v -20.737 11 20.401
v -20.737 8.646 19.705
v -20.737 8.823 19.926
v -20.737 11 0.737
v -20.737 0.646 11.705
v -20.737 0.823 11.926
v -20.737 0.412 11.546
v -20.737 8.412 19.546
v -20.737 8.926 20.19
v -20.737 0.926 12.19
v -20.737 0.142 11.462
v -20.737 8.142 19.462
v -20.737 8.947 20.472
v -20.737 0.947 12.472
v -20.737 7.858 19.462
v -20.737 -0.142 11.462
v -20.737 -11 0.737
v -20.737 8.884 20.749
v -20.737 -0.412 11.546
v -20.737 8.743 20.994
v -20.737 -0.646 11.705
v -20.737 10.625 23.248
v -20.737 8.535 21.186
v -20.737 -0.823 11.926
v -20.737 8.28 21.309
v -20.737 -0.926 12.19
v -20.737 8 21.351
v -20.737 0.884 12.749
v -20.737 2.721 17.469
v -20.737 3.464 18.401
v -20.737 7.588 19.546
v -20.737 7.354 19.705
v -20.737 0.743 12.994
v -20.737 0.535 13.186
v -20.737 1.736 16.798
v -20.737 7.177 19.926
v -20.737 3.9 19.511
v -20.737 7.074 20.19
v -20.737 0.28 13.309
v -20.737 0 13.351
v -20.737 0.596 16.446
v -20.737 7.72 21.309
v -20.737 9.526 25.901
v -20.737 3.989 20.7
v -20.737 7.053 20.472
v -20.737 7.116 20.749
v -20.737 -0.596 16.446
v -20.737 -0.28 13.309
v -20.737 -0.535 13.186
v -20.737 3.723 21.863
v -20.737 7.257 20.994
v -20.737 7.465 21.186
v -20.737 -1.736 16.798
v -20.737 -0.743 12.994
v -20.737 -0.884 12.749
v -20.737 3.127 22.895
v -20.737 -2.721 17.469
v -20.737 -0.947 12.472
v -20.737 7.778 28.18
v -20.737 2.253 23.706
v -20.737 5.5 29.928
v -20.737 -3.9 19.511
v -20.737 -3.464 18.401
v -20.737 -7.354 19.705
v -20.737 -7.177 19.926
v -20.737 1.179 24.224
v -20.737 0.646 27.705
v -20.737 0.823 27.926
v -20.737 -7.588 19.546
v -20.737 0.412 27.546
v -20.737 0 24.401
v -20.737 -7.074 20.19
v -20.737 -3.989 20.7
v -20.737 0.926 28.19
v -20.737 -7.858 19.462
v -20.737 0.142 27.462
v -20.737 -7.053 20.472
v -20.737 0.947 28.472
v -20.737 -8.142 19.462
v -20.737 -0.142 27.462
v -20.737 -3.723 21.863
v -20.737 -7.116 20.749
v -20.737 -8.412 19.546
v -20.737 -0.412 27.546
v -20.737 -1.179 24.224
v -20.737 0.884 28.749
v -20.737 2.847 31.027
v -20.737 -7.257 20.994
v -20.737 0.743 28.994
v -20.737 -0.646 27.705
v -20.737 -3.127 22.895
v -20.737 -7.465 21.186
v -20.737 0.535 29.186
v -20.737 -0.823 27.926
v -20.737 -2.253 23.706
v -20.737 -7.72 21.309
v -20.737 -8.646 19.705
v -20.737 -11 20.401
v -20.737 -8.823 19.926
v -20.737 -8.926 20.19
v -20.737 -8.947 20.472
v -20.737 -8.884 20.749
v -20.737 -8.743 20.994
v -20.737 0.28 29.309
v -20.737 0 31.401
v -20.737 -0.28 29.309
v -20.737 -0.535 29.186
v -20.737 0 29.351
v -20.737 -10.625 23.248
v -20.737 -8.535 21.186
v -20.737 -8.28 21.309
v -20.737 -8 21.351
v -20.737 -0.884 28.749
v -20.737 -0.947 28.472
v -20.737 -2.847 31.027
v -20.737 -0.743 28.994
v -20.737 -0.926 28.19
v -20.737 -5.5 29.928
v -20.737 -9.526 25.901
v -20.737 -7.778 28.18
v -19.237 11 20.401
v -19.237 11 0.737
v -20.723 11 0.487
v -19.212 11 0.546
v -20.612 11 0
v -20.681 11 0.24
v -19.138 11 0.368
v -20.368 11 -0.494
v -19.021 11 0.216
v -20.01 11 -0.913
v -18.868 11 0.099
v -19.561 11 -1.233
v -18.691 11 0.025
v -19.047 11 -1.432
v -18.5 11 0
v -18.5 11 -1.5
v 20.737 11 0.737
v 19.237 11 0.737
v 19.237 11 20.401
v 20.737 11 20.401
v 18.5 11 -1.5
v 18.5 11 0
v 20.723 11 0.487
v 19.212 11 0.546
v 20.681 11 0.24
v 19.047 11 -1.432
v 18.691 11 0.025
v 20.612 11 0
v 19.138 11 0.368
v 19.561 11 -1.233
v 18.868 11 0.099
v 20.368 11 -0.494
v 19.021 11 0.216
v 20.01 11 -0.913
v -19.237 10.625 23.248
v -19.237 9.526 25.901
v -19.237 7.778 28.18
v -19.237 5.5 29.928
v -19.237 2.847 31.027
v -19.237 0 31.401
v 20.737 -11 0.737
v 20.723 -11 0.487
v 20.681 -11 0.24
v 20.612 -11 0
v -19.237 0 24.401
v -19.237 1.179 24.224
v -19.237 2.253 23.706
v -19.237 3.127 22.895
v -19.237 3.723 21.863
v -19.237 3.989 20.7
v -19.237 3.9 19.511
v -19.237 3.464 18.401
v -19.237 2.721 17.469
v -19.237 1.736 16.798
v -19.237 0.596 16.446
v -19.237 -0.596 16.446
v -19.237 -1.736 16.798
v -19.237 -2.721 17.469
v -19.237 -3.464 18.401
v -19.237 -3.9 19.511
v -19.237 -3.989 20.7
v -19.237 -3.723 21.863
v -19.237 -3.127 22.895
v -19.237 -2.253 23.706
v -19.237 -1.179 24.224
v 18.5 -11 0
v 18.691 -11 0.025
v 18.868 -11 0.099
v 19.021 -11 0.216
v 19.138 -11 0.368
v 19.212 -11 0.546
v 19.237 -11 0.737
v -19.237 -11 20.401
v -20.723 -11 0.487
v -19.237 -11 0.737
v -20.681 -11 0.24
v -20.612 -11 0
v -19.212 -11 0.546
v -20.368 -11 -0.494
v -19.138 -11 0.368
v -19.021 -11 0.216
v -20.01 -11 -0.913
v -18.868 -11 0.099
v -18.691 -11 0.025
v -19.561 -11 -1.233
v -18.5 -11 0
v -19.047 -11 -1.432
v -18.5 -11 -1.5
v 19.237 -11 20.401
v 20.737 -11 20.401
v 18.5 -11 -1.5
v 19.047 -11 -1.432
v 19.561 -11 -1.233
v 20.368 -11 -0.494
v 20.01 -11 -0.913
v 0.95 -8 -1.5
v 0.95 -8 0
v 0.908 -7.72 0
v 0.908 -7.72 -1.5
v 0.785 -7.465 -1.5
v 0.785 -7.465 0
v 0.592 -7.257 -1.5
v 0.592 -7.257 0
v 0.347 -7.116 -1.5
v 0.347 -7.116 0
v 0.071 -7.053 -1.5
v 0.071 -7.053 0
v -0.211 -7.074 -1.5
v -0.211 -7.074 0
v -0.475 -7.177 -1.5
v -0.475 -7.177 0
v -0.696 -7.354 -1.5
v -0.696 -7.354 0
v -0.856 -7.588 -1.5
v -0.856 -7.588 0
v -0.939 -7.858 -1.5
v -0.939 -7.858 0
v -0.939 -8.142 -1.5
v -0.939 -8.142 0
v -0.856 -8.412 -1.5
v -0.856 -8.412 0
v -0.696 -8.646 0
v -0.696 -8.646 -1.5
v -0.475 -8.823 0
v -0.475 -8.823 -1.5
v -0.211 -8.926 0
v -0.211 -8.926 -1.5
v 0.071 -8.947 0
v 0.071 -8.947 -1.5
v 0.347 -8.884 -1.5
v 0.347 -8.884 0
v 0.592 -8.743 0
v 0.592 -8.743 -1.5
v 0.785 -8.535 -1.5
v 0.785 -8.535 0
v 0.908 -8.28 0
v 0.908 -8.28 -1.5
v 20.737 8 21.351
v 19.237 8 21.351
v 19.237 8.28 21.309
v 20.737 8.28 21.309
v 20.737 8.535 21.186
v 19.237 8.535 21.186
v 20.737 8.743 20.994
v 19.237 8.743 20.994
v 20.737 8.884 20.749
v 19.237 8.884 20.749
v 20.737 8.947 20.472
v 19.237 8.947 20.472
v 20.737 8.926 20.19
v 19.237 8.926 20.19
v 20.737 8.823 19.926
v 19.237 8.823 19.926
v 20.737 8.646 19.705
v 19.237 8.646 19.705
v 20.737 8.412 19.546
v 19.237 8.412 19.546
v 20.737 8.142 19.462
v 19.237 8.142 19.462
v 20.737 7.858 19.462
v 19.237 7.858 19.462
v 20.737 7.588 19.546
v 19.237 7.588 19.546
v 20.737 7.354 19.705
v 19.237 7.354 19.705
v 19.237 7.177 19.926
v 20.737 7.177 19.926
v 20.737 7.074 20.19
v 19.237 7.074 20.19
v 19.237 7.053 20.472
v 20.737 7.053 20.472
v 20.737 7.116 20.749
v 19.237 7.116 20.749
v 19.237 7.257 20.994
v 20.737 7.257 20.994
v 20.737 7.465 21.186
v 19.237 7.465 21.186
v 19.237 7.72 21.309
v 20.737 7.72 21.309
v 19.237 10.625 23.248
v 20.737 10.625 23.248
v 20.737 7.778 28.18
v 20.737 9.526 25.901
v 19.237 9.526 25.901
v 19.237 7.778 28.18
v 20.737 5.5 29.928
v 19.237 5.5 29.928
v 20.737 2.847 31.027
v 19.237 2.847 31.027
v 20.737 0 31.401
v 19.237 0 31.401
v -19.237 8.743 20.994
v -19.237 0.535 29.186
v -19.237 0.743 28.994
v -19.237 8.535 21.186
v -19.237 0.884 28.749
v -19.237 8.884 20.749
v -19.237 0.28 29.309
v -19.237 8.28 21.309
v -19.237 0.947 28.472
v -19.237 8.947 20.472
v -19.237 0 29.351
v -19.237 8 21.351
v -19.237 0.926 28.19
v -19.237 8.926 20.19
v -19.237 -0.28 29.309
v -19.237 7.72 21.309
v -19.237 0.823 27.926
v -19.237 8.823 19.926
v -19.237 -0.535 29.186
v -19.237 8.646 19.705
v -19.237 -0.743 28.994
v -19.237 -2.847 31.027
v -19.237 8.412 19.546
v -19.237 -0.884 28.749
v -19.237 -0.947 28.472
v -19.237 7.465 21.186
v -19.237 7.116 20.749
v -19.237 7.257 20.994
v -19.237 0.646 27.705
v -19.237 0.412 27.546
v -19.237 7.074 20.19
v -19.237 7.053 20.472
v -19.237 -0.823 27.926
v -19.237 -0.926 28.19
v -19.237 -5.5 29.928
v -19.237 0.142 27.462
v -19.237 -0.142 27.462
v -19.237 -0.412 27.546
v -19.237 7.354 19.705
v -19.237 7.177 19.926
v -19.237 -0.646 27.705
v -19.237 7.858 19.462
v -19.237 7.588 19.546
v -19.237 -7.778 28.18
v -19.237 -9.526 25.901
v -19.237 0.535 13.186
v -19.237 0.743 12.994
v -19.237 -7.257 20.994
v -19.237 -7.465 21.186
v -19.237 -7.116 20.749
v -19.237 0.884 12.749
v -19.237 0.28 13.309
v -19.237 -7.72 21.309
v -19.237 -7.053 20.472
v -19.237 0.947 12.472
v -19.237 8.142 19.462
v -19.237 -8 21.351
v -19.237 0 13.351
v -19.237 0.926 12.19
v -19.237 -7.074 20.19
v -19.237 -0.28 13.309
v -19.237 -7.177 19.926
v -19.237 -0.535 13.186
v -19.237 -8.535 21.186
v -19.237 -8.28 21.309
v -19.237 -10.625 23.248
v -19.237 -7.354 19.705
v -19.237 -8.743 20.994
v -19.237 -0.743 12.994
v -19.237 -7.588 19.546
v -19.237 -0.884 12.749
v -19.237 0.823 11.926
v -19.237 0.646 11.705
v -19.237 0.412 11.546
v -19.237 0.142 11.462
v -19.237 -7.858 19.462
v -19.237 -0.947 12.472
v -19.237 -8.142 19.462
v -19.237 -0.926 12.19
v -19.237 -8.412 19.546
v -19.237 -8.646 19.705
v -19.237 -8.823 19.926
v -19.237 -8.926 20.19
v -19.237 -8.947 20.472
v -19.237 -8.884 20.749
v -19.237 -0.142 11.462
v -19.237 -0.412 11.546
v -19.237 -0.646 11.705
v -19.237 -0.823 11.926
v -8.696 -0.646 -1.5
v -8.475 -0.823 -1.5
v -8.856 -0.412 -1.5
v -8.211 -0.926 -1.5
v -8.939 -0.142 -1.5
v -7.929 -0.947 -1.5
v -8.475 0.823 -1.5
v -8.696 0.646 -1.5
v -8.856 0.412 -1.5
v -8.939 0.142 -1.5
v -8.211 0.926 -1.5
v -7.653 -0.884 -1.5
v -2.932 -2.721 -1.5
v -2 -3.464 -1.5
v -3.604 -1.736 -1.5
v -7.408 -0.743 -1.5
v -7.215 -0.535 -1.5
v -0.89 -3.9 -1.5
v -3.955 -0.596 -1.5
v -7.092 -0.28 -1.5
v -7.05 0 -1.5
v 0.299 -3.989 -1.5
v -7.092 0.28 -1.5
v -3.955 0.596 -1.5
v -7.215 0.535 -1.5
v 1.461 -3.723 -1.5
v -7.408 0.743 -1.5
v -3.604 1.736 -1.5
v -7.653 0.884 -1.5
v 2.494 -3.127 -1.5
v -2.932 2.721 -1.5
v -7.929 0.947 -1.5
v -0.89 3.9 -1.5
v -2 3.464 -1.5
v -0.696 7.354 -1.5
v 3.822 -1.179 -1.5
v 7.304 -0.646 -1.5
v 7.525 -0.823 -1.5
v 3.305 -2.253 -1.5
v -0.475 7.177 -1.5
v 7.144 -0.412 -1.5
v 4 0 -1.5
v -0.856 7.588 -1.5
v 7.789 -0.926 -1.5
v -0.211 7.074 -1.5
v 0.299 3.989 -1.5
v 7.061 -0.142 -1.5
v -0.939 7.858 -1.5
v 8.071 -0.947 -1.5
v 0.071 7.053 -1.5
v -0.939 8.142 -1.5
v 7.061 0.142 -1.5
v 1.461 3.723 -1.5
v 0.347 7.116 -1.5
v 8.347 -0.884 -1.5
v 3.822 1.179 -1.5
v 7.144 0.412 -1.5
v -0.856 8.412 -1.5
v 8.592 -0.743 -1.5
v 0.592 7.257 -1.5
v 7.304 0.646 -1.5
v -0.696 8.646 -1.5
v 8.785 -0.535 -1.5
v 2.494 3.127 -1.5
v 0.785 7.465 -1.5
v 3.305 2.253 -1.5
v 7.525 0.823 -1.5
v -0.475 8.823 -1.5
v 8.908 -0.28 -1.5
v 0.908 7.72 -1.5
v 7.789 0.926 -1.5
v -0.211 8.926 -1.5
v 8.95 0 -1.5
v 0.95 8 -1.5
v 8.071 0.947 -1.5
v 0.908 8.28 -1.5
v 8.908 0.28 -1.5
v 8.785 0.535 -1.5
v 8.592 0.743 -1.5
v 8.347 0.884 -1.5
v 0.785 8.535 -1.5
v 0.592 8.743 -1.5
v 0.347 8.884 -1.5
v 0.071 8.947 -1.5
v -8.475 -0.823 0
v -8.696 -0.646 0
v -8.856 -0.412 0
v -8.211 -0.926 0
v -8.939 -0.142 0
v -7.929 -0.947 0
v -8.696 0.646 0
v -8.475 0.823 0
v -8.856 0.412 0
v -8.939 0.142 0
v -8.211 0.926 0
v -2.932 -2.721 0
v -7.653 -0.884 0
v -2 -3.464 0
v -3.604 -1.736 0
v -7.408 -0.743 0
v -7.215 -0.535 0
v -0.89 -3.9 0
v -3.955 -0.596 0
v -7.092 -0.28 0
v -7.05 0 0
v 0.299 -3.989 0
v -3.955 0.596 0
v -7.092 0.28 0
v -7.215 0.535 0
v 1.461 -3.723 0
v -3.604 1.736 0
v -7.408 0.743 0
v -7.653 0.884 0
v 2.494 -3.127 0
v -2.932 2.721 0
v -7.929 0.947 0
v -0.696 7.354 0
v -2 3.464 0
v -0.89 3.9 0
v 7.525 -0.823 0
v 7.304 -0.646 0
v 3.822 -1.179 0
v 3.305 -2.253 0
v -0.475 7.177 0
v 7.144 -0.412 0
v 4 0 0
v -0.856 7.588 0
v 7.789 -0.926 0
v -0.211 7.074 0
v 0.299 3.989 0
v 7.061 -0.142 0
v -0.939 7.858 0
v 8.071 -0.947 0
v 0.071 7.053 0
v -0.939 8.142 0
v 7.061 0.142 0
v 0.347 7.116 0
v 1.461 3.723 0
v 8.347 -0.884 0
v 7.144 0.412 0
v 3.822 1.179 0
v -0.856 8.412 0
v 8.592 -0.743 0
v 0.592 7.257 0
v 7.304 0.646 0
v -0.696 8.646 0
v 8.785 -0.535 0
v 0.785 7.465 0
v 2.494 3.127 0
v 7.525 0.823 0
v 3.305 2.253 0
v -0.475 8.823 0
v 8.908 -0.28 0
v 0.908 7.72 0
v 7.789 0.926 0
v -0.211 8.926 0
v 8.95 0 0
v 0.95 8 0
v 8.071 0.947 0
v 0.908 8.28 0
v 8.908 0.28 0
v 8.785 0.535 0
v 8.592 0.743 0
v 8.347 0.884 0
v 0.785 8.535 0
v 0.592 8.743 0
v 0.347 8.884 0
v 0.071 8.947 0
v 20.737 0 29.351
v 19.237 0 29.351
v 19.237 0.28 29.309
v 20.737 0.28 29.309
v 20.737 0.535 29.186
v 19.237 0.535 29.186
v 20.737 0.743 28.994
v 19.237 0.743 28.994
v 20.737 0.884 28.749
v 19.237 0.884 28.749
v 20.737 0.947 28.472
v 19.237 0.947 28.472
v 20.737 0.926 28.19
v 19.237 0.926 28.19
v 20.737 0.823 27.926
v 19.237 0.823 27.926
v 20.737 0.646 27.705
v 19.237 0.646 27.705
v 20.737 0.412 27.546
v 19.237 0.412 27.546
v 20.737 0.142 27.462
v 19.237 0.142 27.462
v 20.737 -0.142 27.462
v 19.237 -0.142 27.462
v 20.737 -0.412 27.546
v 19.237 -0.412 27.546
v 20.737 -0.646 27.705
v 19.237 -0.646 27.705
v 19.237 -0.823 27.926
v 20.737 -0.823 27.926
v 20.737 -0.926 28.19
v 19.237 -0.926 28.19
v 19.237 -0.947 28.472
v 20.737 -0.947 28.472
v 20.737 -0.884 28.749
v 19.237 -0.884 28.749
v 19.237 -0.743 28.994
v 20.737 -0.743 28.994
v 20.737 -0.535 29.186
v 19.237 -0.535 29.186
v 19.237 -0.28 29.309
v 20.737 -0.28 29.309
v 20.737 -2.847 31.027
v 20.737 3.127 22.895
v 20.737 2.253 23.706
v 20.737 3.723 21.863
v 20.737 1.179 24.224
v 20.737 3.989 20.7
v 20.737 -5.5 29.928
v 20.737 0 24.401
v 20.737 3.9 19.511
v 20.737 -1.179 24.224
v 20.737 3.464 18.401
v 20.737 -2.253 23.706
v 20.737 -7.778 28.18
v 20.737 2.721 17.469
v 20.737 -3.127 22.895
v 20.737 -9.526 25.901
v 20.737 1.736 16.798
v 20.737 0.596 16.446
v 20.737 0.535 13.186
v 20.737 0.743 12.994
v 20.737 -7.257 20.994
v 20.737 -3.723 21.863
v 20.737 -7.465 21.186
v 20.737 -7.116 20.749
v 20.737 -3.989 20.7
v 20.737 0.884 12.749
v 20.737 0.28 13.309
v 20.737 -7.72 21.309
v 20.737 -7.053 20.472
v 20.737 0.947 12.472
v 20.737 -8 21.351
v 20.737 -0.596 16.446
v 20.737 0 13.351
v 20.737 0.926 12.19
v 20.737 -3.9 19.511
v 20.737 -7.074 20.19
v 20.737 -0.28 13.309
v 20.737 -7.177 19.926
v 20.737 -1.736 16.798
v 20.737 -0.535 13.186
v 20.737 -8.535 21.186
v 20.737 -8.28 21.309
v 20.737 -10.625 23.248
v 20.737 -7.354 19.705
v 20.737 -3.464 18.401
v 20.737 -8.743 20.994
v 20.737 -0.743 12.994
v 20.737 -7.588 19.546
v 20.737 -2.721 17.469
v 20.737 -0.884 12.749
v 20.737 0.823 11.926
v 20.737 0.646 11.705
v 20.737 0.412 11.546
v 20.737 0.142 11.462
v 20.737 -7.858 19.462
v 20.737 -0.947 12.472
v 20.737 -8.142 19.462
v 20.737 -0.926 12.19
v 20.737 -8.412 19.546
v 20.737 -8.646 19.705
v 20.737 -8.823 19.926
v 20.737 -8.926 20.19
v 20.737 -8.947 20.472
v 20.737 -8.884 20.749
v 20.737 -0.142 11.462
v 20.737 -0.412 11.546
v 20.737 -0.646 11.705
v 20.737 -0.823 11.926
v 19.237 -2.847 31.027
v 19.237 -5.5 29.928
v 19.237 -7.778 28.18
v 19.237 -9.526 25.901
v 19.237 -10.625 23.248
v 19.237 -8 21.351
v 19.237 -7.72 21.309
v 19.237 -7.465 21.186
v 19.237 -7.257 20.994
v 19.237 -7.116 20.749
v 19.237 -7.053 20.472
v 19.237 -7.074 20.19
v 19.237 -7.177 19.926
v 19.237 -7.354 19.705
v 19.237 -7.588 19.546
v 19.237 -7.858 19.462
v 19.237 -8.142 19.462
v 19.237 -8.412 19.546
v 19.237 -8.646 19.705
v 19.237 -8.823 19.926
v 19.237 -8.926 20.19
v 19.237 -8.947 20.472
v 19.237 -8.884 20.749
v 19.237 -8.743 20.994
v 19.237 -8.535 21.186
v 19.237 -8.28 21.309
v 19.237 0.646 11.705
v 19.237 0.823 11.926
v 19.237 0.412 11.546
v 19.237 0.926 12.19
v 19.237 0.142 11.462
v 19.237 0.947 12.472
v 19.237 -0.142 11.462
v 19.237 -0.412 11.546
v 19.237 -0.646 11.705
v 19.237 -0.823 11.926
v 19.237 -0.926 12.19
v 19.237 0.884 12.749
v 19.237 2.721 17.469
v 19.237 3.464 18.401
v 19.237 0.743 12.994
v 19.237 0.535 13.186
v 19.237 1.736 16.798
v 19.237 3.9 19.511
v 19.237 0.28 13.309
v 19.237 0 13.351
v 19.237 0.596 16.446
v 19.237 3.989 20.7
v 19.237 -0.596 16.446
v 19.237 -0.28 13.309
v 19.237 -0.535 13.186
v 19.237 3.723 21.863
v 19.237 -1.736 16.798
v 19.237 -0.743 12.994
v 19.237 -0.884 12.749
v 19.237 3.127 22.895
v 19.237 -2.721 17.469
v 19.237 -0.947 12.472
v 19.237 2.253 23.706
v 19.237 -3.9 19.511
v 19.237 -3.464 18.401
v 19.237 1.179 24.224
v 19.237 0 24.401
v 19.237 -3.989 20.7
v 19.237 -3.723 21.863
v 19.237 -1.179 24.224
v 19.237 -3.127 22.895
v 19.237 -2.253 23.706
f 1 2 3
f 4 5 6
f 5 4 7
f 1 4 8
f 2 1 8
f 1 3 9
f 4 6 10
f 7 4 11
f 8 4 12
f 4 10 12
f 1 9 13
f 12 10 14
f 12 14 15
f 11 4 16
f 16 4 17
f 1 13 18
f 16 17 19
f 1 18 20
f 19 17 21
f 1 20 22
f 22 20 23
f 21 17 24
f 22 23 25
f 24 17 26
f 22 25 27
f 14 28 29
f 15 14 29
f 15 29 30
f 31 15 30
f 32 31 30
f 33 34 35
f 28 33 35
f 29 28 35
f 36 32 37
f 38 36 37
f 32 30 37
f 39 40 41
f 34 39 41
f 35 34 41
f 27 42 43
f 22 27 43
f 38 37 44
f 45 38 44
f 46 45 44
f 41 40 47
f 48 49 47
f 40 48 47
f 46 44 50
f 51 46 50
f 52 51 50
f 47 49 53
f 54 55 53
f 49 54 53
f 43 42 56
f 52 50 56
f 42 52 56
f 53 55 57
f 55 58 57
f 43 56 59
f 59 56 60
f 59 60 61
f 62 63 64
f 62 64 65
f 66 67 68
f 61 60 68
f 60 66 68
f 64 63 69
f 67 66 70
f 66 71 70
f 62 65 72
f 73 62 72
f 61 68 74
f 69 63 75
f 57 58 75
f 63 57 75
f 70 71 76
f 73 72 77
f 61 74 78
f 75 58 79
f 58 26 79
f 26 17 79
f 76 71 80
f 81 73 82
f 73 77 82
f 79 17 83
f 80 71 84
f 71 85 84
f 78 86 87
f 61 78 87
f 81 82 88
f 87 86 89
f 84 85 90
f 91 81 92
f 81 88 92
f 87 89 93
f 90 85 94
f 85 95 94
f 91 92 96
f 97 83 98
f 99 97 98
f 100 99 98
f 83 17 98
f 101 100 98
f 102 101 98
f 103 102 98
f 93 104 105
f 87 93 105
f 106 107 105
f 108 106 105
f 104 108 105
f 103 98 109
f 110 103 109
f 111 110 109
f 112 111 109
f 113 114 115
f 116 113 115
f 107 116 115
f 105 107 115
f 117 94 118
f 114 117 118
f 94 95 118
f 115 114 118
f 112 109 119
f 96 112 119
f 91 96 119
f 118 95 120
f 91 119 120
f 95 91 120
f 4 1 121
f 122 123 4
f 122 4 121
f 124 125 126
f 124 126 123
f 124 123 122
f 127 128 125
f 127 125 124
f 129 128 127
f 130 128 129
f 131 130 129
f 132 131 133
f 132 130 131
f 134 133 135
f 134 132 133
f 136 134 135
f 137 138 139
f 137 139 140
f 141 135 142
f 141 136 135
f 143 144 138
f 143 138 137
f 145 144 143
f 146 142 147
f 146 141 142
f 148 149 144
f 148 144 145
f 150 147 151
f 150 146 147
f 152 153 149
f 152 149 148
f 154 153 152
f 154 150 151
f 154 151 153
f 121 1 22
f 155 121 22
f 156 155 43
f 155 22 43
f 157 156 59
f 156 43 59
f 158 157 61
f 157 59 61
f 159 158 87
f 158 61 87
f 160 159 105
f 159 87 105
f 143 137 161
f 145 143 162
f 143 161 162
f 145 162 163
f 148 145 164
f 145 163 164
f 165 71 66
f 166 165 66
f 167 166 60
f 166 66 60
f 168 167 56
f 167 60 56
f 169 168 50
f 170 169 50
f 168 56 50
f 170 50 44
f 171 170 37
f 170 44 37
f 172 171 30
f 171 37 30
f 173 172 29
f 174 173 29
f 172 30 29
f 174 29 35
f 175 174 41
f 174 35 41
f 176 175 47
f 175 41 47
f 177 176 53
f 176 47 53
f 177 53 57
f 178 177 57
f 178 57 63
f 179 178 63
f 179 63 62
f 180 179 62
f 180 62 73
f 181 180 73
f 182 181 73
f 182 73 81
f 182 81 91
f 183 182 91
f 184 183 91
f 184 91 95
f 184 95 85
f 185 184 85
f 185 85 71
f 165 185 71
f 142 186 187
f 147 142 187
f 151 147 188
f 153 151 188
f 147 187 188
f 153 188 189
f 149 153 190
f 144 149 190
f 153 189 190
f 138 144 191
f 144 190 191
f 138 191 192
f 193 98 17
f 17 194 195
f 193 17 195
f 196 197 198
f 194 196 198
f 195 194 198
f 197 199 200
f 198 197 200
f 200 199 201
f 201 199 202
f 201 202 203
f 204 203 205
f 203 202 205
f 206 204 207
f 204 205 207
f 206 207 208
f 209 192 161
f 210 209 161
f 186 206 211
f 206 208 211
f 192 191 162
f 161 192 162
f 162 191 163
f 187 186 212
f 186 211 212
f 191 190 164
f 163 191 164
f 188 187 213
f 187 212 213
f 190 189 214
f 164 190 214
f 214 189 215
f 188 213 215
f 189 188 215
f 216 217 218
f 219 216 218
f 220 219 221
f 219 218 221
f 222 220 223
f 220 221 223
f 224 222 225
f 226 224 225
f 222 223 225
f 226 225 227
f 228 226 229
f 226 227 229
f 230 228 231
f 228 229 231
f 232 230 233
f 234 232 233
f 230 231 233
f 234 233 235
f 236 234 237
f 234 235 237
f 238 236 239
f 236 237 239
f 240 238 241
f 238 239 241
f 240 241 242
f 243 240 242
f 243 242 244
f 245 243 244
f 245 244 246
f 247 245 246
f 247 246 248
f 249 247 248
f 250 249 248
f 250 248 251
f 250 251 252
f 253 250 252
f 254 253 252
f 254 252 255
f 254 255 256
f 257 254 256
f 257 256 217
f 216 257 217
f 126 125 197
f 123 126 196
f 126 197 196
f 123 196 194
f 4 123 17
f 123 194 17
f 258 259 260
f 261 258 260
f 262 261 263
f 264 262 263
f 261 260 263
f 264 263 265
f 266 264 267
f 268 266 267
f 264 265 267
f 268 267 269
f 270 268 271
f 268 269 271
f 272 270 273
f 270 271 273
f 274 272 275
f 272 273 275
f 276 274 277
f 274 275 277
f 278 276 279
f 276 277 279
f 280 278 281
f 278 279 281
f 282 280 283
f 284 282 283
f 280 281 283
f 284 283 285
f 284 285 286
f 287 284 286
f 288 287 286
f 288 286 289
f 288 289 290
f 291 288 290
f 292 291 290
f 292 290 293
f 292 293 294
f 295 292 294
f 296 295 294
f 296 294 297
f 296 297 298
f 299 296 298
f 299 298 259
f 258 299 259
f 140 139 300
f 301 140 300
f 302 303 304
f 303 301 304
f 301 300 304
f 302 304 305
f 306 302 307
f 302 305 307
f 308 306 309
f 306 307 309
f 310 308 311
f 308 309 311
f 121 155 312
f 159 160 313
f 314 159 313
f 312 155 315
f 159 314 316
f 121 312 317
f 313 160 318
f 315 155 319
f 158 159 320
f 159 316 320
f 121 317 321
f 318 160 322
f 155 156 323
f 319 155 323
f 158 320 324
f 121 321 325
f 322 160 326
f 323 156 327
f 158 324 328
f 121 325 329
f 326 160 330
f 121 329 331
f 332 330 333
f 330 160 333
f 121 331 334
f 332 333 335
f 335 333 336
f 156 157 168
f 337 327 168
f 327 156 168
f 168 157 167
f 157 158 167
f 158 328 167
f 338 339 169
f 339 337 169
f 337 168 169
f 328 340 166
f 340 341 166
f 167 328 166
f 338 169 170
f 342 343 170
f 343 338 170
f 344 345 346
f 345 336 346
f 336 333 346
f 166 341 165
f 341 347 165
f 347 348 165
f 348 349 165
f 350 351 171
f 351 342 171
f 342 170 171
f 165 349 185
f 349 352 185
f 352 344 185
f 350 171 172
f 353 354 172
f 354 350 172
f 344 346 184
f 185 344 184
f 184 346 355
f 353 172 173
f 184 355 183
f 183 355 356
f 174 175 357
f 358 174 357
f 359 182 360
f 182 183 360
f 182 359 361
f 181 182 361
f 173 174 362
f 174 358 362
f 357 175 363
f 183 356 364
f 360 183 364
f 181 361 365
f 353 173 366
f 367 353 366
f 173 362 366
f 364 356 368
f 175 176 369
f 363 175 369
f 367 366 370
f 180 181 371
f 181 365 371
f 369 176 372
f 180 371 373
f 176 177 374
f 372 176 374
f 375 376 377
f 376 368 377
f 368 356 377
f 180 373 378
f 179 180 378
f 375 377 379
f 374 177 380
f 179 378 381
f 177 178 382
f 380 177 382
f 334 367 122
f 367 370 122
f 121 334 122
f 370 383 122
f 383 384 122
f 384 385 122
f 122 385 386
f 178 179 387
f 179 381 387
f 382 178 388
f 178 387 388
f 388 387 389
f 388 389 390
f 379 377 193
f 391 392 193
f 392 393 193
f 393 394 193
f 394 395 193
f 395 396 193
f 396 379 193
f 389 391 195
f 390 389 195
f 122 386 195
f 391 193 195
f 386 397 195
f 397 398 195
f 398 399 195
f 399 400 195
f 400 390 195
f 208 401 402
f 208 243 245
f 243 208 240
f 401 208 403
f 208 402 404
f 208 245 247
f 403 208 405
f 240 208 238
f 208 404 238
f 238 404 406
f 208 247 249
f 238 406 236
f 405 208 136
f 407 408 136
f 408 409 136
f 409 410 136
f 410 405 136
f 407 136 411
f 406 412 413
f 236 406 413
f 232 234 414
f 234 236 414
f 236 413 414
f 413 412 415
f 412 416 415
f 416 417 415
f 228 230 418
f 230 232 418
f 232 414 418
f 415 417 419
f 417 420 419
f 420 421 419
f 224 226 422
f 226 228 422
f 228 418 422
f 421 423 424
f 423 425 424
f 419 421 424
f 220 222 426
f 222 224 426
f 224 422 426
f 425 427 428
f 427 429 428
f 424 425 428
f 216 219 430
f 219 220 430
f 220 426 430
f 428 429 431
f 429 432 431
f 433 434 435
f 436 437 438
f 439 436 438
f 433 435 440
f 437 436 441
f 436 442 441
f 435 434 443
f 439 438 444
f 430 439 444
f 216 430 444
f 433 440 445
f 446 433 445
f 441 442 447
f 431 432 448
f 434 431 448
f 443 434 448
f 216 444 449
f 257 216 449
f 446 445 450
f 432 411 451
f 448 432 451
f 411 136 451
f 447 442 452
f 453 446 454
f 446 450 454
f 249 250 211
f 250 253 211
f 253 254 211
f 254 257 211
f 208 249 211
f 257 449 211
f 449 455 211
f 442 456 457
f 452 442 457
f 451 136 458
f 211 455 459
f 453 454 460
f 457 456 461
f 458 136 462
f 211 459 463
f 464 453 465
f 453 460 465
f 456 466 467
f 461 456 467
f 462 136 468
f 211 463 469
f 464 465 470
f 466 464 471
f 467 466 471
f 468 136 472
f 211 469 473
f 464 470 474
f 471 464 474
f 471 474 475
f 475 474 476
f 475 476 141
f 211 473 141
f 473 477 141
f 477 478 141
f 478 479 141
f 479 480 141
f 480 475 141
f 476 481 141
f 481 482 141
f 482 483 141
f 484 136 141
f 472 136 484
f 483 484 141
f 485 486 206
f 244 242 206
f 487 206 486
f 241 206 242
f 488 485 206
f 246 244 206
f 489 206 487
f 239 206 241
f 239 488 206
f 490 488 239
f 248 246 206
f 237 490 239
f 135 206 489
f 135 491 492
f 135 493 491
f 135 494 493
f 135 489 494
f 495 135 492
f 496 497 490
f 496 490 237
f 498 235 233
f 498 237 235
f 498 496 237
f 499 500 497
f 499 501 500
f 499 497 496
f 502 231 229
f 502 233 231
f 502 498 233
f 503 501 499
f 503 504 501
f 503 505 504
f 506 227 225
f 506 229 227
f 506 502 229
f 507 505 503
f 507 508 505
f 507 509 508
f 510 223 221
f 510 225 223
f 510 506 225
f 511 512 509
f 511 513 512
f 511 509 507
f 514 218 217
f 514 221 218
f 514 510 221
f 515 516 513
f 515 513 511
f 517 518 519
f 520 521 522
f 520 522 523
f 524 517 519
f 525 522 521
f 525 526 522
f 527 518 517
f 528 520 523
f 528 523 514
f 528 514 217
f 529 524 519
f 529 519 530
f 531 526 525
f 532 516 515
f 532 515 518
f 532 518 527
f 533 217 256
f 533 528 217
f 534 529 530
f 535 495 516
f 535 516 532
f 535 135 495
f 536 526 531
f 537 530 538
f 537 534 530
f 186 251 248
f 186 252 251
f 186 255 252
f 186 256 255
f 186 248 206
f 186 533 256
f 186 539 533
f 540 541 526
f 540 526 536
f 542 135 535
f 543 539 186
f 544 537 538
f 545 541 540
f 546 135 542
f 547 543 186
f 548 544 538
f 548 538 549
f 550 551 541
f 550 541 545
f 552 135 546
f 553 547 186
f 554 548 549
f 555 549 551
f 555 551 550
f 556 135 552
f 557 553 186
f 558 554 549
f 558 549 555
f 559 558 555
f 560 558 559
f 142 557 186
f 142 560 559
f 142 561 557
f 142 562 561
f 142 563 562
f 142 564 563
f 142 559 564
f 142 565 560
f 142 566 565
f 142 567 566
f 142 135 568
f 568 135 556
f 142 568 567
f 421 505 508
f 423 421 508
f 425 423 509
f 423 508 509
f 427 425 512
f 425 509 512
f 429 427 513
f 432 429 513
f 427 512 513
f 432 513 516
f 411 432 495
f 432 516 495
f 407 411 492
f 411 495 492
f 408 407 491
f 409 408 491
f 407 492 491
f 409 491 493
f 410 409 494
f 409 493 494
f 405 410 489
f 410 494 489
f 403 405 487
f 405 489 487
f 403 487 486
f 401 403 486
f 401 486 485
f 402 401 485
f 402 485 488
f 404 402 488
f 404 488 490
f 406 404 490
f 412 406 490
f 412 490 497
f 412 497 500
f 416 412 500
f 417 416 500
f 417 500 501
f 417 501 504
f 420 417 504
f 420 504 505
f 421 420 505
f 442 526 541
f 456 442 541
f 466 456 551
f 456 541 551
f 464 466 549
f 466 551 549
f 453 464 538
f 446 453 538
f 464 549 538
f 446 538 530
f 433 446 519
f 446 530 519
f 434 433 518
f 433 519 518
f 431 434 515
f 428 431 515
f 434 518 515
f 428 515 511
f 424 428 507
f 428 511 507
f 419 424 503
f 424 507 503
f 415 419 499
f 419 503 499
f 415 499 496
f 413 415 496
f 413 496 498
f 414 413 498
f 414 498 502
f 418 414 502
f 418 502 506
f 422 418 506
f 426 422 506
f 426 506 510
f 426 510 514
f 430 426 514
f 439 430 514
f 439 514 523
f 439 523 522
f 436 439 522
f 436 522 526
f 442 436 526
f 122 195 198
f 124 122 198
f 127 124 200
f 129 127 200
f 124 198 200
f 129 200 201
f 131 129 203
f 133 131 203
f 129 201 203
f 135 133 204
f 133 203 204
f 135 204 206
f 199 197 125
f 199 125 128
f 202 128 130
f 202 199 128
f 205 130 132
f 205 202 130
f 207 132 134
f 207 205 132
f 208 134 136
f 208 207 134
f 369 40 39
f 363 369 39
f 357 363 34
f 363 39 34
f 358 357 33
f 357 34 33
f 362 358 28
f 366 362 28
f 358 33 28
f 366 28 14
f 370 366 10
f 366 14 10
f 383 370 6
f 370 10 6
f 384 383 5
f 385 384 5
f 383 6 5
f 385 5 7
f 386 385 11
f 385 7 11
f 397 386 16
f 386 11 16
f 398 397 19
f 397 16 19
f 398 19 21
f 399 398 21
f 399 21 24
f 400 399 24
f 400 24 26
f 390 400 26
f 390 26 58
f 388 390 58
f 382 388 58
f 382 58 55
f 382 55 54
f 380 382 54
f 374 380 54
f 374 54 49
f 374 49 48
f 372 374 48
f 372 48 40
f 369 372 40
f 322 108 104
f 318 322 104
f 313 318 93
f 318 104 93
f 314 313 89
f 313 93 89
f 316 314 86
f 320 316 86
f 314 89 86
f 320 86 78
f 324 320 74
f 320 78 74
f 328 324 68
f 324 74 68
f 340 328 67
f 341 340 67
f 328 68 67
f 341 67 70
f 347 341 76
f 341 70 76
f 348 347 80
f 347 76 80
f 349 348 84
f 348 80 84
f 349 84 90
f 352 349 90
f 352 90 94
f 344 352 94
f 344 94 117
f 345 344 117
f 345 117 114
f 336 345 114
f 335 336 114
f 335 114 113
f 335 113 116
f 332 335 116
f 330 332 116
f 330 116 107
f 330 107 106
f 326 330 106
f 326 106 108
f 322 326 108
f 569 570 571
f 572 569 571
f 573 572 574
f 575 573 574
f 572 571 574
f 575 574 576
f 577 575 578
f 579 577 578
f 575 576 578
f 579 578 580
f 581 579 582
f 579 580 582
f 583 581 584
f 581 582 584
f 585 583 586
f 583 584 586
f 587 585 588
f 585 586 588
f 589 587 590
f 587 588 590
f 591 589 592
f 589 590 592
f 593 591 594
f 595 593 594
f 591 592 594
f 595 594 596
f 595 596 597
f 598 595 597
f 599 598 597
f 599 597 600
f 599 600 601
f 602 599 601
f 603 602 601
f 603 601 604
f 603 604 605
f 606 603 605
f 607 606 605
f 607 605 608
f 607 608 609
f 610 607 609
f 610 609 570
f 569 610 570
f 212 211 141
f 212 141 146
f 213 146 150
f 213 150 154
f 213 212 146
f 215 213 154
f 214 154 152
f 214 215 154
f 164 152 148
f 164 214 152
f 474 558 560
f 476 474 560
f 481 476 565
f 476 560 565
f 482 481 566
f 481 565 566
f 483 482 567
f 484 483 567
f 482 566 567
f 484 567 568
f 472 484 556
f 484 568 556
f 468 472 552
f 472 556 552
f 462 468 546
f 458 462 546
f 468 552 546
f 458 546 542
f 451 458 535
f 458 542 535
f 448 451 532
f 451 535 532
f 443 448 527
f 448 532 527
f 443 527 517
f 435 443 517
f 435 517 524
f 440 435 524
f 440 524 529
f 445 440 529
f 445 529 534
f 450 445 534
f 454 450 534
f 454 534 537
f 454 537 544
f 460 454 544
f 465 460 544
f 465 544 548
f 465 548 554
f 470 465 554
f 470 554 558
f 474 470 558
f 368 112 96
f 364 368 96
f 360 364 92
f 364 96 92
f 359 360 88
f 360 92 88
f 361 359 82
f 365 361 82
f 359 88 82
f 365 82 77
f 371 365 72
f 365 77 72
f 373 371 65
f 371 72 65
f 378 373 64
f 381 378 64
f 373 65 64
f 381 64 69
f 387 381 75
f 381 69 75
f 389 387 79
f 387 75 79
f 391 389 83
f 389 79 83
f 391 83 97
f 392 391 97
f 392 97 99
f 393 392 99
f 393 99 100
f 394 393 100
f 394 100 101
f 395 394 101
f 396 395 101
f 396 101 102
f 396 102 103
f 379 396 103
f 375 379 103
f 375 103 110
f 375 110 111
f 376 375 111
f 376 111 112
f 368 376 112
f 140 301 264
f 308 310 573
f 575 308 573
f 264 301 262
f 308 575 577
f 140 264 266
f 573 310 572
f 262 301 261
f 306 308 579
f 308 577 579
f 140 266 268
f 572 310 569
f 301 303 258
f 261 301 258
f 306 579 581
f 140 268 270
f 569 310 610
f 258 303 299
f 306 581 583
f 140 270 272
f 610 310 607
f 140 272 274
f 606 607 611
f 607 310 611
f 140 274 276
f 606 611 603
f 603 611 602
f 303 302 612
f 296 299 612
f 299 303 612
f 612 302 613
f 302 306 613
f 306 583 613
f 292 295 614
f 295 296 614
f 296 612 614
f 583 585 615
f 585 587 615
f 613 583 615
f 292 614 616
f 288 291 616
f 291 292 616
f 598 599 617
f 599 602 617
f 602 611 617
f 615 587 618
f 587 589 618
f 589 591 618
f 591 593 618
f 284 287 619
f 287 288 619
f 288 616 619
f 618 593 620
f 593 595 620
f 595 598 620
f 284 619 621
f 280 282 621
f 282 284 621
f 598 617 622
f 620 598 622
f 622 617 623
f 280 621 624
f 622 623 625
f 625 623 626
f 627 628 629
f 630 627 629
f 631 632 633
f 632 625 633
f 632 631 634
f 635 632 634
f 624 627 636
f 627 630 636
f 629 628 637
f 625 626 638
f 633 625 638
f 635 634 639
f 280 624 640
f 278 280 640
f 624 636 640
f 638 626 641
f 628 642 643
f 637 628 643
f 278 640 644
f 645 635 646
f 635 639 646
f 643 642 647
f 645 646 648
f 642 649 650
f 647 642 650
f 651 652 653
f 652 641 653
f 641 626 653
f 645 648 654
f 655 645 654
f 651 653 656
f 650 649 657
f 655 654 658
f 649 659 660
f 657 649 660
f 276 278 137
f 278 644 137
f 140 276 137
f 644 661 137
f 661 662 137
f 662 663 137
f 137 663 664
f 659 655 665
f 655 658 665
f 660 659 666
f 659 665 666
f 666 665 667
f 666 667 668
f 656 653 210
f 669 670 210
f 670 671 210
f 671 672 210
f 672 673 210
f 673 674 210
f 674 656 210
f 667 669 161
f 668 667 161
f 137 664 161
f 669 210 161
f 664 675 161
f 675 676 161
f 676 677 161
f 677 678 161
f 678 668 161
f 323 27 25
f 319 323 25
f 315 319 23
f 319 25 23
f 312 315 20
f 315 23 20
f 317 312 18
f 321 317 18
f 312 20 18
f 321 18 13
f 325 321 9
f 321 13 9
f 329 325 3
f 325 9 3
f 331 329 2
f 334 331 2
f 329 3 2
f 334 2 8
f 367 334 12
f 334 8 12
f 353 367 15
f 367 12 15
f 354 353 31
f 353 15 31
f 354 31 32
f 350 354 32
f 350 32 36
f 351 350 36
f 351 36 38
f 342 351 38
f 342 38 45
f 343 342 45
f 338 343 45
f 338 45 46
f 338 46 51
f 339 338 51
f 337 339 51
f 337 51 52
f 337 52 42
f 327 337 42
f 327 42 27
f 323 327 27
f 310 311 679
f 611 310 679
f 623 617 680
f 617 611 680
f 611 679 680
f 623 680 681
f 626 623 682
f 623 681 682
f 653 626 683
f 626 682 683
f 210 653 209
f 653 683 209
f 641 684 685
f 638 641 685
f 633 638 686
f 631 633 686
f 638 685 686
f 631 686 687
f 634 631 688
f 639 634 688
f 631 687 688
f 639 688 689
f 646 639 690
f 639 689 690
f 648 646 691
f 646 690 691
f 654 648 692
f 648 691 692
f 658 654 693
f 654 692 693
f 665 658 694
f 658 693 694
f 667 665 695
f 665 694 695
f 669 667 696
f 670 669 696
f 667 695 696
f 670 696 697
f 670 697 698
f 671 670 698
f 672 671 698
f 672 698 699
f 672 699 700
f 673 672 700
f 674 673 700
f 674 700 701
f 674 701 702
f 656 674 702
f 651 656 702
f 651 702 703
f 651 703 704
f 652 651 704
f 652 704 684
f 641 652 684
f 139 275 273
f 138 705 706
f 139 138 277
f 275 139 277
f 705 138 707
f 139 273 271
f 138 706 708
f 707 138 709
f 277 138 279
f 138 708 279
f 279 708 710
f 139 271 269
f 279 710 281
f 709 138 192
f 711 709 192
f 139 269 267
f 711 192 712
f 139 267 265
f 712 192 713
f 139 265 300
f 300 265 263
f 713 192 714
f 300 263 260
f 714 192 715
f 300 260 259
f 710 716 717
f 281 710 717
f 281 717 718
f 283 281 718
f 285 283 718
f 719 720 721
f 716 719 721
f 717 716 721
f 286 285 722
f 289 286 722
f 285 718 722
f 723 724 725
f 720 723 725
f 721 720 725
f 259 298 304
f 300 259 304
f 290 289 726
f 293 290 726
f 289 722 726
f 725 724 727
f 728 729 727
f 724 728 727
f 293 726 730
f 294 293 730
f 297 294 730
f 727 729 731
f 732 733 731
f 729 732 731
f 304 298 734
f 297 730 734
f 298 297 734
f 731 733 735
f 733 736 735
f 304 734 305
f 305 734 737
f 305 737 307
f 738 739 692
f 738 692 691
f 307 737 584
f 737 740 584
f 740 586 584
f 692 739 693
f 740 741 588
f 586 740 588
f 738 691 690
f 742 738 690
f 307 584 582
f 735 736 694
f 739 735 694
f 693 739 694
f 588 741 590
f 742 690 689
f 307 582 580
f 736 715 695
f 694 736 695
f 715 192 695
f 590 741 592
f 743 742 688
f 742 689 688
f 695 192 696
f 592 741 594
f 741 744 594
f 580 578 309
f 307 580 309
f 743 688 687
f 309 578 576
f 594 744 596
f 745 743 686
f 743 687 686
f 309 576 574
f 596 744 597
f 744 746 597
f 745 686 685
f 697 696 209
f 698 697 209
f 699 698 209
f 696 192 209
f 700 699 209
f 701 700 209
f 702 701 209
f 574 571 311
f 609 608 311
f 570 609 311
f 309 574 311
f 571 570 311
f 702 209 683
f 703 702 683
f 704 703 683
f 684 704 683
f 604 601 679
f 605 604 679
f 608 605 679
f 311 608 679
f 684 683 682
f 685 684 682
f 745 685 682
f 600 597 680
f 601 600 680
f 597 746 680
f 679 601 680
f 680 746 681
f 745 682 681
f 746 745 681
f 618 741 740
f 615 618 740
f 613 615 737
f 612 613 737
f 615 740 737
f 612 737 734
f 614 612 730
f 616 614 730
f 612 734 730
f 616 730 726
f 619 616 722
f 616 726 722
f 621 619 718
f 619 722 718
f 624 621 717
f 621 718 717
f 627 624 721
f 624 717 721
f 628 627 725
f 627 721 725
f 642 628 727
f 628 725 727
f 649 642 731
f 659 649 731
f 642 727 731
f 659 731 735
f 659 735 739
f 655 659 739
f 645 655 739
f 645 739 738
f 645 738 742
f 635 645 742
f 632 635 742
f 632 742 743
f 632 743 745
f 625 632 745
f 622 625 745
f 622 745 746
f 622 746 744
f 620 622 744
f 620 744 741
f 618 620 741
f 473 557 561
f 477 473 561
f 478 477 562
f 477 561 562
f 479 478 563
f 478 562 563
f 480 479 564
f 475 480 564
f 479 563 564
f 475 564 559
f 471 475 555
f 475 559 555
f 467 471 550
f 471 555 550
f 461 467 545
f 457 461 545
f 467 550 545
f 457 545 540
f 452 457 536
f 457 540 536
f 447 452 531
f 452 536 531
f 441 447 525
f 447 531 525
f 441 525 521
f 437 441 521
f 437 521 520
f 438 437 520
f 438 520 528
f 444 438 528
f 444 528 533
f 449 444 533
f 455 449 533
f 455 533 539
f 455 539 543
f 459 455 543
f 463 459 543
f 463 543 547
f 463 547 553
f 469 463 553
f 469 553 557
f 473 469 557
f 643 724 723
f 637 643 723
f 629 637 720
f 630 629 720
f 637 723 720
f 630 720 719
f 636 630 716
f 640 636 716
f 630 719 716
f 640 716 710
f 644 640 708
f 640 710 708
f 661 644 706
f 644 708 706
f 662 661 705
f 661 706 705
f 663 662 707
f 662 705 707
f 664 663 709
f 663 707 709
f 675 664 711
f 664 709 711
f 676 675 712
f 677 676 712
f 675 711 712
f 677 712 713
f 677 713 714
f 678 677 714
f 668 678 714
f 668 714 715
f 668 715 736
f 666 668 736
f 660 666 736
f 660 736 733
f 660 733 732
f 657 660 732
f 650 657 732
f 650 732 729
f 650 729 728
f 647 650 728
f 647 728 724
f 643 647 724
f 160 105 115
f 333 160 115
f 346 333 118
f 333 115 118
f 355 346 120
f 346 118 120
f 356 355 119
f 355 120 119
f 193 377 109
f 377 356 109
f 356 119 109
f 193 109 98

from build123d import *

# Parameters (mm, degrees)
SKETCH_1_W             = 103
SKETCH_1_H             = 22
SM_BASE_FLANGE_1_DEPTH = 1.5
OTHER_START            = -11
OTHER_1_DEPTH          = 22
OTHER_1_2_DEPTH        = 22
SKETCH_7_R             = 0.95
SKETCH_7_R_2           = 4
CUT_EXTRUDE_1_DEPTH    = 54.170270292
SKETCH_8_R             = 4
SKETCH_8_R_2           = 0.95
CUT_EXTRUDE_2_DEPTH    = 10


# Read off the part's stored shape, not the designer's step: 绘制的折弯1
# Sheet-metal steps are written as plain solids
with BuildPart() as part:
    # Sketch 1 → 基体-法兰1 (new body)
    with BuildSketch(Plane.XY):
        Rectangle(SKETCH_1_W, SKETCH_1_H)
    extrude(amount=-SM_BASE_FLANGE_1_DEPTH)

    # Other 1 outline → Other 1 (cut)
    with BuildSketch(Plane(origin=(0, 0, 0), x_dir=(1, 0, 0), z_dir=(0, 1, 0)).offset(OTHER_START)):
        with BuildLine():
            ThreePointArc((-20.611823856, 0), (-19.795164082, 1.086838938), (-18.5, 1.5))
            Line((-18.5, 1.5), (-51.5, 1.5))
            Line((-51.5, 1.5), (-51.5, 0))
            Line((-51.5, 0), (-20.611823856, 0))
        make_face()
        with BuildLine():
            Line((51.5, 1.5), (18.5, 1.5))
            ThreePointArc((18.5, 1.5), (19.795164082, 1.086838938), (20.611823856, 0))
            Line((20.611823856, 0), (51.5, 0))
            Line((51.5, 0), (51.5, 1.5))
        make_face()
    extrude(amount=OTHER_1_DEPTH, mode=Mode.SUBTRACT)

    # Other 1 2 outline → Other 1 2 (add)
    with BuildSketch(Plane(origin=(0, 0, 0), x_dir=(1, 0, 0), z_dir=(0, 1, 0)).offset(OTHER_START)):
        with BuildLine():
            Line((-18.5, 0), (-20.611823856, 0))
            ThreePointArc((-20.611823856, 0), (-20.705185343, -0.363053267), (-20.7366, -0.7366))
            Line((-20.7366, -0.7366), (-20.7366, -31.401454181))
            Line((-20.7366, -31.401454181), (-19.2366, -31.401454181))
            Line((-19.2366, -31.401454181), (-19.2366, -0.7366))
            ThreePointArc((-19.2366, -0.7366), (-19.020854855, -0.215745145), (-18.5, 0))
        make_face()
        with BuildLine():
            ThreePointArc((20.7366, -0.7366), (20.705185343, -0.363053267), (20.611823856, 0))
            Line((20.611823856, 0), (18.5, 0))
            ThreePointArc((18.5, 0), (19.020854855, -0.215745145), (19.2366, -0.7366))
            Line((19.2366, -0.7366), (19.2366, -31.401454181))
            Line((19.2366, -31.401454181), (20.7366, -31.401454181))
            Line((20.7366, -31.401454181), (20.7366, -0.7366))
        make_face()
    extrude(amount=OTHER_1_2_DEPTH)

    # 草图7 → 切除-拉伸1 (cut, through all)
    with BuildSketch(Plane.ZY.offset(20.7366)):
        with Locations((20.401454181, 8)):
            Circle(SKETCH_7_R)
        with Locations((12.401454181, 0)):
            Circle(SKETCH_7_R)
        with Locations((20.401454181, 0)):
            Circle(SKETCH_7_R_2)
        with Locations((28.401454181, 0)):
            Circle(SKETCH_7_R)
        with Locations((20.401454181, -8)):
            Circle(SKETCH_7_R)
        with BuildLine():
            ThreePointArc((20.401454181, 11), (28.179628774, 7.778174593), (31.401454181, 0))
            Line((31.401454181, 0), (31.401454181, 11))
            Line((31.401454181, 11), (20.401454181, 11))
        make_face()
        with BuildLine():
            Line((31.401454181, -11), (31.401454181, 0))
            ThreePointArc((31.401454181, 0), (28.179628774, -7.778174593), (20.401454181, -11))
            Line((20.401454181, -11), (31.401454181, -11))
        make_face()
    extrude(amount=-CUT_EXTRUDE_1_DEPTH, mode=Mode.SUBTRACT)

    # 草图8 → 切除-拉伸2 (cut)
    with BuildSketch(Plane.XY):
        Circle(SKETCH_8_R)
        with Locations((0, 8)):
            Circle(SKETCH_8_R_2)
        with Locations((8, 0)):
            Circle(SKETCH_8_R_2)
        with Locations((0, -8)):
            Circle(SKETCH_8_R_2)
        with Locations((-8, 0)):
            Circle(SKETCH_8_R_2)
    extrude(amount=-CUT_EXTRUDE_2_DEPTH, mode=Mode.SUBTRACT)


solid = part.part
